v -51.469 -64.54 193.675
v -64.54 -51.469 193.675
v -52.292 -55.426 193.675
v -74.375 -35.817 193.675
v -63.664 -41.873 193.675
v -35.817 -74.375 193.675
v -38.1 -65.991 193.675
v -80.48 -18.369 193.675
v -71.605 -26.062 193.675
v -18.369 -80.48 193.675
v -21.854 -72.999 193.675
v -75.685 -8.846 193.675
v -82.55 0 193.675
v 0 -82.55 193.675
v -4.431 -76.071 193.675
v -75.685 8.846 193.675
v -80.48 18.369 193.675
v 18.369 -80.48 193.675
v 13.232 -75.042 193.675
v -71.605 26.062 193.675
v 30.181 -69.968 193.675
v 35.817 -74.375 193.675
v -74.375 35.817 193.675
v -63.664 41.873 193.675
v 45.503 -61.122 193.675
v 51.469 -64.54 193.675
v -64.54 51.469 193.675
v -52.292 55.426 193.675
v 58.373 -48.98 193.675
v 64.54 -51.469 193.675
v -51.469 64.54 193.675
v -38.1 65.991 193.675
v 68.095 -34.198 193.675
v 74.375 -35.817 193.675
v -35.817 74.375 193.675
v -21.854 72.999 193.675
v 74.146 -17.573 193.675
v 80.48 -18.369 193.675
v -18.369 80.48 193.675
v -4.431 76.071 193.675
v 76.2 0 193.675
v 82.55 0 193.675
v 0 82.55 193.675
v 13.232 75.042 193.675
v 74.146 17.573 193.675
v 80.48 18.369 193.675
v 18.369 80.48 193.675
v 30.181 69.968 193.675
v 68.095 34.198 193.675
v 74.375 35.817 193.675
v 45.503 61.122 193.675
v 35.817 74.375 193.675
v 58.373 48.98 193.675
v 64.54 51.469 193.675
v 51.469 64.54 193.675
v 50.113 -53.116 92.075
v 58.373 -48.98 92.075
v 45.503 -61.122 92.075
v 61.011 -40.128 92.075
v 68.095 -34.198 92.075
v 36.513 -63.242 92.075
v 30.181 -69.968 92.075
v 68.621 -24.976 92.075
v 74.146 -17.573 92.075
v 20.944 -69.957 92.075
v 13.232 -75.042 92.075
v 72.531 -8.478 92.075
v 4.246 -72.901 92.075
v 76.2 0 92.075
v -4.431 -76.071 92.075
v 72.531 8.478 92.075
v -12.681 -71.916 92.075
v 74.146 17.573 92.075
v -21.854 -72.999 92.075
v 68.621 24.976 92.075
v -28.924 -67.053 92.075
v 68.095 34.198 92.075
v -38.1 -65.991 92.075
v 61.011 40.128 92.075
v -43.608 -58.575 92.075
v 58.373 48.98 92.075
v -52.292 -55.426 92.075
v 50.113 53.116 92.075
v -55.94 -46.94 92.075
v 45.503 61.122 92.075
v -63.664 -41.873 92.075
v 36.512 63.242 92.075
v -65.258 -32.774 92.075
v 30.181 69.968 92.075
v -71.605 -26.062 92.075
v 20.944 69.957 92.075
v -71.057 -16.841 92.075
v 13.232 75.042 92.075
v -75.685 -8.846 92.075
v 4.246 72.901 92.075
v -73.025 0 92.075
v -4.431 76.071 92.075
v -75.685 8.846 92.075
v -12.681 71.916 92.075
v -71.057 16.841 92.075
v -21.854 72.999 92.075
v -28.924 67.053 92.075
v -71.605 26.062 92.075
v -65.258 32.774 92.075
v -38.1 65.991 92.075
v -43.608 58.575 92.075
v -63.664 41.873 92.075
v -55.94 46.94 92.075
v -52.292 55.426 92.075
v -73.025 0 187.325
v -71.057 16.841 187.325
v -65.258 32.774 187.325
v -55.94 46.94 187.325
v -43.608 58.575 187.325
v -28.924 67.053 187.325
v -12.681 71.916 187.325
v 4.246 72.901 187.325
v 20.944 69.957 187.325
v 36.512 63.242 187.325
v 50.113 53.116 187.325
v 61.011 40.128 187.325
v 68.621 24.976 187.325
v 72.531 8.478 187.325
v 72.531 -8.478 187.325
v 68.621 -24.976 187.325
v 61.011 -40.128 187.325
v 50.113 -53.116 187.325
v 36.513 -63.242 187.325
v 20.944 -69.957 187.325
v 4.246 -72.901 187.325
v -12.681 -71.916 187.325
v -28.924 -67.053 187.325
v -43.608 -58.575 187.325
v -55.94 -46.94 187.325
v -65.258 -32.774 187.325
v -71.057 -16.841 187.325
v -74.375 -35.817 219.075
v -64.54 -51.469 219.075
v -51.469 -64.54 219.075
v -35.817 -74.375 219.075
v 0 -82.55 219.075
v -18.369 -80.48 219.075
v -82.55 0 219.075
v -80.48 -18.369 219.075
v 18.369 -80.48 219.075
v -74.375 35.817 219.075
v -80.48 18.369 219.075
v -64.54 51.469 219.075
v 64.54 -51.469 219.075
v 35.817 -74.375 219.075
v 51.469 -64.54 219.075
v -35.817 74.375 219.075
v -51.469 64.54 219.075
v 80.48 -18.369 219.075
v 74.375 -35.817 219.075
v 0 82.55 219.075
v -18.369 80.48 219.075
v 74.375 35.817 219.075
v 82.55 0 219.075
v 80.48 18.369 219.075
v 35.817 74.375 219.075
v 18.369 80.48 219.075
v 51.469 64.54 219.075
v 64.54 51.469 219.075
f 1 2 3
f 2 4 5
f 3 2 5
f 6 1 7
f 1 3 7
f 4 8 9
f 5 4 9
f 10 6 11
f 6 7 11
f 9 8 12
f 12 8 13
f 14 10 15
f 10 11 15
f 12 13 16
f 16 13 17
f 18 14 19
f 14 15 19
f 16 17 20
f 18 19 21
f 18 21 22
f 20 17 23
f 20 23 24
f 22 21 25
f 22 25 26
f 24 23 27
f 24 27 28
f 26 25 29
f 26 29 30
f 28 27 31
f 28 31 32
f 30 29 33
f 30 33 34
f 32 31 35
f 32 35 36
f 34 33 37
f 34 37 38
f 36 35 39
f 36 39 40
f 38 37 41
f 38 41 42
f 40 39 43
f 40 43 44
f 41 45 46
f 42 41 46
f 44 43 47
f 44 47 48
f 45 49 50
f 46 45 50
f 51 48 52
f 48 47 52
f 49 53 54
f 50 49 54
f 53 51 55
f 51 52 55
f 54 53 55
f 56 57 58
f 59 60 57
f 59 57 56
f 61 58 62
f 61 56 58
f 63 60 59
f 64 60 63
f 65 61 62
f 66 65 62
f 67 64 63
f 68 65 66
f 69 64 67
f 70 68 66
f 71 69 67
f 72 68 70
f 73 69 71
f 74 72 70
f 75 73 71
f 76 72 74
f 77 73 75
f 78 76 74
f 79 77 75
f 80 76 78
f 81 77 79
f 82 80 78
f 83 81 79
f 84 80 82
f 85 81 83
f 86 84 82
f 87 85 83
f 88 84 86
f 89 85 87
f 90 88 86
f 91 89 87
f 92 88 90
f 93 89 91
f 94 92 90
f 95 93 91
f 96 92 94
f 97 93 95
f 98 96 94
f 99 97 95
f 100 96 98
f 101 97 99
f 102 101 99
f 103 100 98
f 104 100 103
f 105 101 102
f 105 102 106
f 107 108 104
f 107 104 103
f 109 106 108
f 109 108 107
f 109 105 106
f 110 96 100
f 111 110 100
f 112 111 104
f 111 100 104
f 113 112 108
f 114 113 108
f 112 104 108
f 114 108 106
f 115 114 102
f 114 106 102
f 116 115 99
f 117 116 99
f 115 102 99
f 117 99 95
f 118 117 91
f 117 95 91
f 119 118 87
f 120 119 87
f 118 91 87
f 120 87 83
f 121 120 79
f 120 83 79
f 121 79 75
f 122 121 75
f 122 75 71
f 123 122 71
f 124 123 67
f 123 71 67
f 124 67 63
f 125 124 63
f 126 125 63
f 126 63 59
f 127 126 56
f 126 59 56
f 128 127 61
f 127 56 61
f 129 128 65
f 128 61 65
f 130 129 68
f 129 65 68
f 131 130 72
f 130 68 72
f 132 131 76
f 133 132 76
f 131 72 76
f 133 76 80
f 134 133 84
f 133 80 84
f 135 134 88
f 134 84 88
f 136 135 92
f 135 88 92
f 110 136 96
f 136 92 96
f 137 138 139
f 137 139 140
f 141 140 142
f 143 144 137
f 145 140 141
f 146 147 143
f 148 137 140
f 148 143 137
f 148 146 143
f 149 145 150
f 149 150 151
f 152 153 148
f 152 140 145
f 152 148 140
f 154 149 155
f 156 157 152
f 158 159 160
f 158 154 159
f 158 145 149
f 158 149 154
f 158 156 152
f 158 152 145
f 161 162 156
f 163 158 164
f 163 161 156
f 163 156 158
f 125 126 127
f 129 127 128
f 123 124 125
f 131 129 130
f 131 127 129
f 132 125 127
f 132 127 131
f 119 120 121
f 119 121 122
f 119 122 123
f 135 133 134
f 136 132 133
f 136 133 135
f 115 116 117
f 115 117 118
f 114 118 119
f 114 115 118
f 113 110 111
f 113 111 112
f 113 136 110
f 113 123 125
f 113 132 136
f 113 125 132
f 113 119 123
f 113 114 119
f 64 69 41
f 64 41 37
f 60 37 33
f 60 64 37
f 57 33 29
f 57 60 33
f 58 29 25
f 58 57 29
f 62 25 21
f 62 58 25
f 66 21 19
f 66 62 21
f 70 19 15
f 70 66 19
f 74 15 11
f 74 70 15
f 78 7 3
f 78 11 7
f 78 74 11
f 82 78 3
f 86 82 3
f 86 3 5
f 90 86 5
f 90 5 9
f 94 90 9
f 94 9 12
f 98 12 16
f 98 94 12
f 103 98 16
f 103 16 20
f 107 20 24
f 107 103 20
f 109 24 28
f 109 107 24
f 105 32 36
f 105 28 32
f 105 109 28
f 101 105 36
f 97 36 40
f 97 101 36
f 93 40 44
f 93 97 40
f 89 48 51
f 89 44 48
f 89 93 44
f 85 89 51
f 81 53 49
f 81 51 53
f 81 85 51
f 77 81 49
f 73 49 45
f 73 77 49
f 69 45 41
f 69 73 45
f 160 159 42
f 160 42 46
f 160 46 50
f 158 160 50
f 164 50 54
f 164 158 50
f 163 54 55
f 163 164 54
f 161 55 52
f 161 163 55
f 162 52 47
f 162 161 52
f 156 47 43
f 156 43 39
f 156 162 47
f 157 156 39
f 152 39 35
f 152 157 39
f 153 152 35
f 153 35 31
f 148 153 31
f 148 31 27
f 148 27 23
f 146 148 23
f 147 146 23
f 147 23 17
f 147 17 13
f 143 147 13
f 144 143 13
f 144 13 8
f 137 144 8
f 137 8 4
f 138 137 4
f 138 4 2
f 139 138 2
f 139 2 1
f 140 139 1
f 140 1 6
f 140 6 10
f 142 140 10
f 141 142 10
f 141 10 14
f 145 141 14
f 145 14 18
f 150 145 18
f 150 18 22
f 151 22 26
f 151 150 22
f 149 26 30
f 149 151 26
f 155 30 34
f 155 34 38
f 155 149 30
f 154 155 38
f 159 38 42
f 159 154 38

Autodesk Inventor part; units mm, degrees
ref_plane "YZ Plane" through (0, 0, 0) normal (1, 0, 0) x (0, 1, 0)
ref_plane "XZ Plane" through (0, 0, 0) normal (0, 1, 0) x (-1, 0, 0)
ref_plane "XY Plane" through (0, 0, 0) normal (0, 0, 1) x (1, 0, 0)
sketch "Sketch1" plane through (0, 0, 0) normal (0, 0, 1) x (1, 0, 0)
  circle A0 centre (0, 0) radius 76.2
  dimension "tubeDiameter" = 152.4
extrude "Extrusion1" add sketch "Sketch1" along normal mid plane 438.15
sketch "Sketch2" plane through (0, 0, -219.075) normal (0, 0, -1) x (-1, 0, 0)
  circle A0 centre (0, 0) radius 73.025
  dimension "d6" = 146.05
extrude "Extrusion2" cut sketch "Sketch2" against normal blind 406.4
sketch "Sketch3" plane through (0, 0, 219.075) normal (0, 0, 1) x (1, 0, 0)
  circle A0 centre (0, 0) radius 82.55
  circle A1 centre (0, 0) radius 76.2
  dimension "d9" = 165.1
extrude "Extrusion3" add sketch "Sketch3" against normal blind 25.4
sketch "Sketch4" plane through (0, 0, -219.075) normal (0, 0, -1) x (-1, 0, 0)
  circle A0 centre (0, 0) radius 76.2
  circle A1 centre (0, 0) radius 82.55
extrude "Extrusion4" add sketch "Sketch4" against normal blind 25.4
sketch "Sketch7" plane through (0, 0, -219.075) normal (0, 0, -1) x (-1, 0, 0)
  circle A0 centre (0, 0) radius 73.025 projected
  circle A1 centre (0, 0) radius 82.55 projected
  circle A2 centre (0, 0) radius 73.025
  circle A3 centre (0, 0) radius 82.55
extrude "Extrusion6" cut sketch "Sketch7" against normal blind 311.15
properties part number "trussTelescopeTubeRear" material "Aluminum 6061"
